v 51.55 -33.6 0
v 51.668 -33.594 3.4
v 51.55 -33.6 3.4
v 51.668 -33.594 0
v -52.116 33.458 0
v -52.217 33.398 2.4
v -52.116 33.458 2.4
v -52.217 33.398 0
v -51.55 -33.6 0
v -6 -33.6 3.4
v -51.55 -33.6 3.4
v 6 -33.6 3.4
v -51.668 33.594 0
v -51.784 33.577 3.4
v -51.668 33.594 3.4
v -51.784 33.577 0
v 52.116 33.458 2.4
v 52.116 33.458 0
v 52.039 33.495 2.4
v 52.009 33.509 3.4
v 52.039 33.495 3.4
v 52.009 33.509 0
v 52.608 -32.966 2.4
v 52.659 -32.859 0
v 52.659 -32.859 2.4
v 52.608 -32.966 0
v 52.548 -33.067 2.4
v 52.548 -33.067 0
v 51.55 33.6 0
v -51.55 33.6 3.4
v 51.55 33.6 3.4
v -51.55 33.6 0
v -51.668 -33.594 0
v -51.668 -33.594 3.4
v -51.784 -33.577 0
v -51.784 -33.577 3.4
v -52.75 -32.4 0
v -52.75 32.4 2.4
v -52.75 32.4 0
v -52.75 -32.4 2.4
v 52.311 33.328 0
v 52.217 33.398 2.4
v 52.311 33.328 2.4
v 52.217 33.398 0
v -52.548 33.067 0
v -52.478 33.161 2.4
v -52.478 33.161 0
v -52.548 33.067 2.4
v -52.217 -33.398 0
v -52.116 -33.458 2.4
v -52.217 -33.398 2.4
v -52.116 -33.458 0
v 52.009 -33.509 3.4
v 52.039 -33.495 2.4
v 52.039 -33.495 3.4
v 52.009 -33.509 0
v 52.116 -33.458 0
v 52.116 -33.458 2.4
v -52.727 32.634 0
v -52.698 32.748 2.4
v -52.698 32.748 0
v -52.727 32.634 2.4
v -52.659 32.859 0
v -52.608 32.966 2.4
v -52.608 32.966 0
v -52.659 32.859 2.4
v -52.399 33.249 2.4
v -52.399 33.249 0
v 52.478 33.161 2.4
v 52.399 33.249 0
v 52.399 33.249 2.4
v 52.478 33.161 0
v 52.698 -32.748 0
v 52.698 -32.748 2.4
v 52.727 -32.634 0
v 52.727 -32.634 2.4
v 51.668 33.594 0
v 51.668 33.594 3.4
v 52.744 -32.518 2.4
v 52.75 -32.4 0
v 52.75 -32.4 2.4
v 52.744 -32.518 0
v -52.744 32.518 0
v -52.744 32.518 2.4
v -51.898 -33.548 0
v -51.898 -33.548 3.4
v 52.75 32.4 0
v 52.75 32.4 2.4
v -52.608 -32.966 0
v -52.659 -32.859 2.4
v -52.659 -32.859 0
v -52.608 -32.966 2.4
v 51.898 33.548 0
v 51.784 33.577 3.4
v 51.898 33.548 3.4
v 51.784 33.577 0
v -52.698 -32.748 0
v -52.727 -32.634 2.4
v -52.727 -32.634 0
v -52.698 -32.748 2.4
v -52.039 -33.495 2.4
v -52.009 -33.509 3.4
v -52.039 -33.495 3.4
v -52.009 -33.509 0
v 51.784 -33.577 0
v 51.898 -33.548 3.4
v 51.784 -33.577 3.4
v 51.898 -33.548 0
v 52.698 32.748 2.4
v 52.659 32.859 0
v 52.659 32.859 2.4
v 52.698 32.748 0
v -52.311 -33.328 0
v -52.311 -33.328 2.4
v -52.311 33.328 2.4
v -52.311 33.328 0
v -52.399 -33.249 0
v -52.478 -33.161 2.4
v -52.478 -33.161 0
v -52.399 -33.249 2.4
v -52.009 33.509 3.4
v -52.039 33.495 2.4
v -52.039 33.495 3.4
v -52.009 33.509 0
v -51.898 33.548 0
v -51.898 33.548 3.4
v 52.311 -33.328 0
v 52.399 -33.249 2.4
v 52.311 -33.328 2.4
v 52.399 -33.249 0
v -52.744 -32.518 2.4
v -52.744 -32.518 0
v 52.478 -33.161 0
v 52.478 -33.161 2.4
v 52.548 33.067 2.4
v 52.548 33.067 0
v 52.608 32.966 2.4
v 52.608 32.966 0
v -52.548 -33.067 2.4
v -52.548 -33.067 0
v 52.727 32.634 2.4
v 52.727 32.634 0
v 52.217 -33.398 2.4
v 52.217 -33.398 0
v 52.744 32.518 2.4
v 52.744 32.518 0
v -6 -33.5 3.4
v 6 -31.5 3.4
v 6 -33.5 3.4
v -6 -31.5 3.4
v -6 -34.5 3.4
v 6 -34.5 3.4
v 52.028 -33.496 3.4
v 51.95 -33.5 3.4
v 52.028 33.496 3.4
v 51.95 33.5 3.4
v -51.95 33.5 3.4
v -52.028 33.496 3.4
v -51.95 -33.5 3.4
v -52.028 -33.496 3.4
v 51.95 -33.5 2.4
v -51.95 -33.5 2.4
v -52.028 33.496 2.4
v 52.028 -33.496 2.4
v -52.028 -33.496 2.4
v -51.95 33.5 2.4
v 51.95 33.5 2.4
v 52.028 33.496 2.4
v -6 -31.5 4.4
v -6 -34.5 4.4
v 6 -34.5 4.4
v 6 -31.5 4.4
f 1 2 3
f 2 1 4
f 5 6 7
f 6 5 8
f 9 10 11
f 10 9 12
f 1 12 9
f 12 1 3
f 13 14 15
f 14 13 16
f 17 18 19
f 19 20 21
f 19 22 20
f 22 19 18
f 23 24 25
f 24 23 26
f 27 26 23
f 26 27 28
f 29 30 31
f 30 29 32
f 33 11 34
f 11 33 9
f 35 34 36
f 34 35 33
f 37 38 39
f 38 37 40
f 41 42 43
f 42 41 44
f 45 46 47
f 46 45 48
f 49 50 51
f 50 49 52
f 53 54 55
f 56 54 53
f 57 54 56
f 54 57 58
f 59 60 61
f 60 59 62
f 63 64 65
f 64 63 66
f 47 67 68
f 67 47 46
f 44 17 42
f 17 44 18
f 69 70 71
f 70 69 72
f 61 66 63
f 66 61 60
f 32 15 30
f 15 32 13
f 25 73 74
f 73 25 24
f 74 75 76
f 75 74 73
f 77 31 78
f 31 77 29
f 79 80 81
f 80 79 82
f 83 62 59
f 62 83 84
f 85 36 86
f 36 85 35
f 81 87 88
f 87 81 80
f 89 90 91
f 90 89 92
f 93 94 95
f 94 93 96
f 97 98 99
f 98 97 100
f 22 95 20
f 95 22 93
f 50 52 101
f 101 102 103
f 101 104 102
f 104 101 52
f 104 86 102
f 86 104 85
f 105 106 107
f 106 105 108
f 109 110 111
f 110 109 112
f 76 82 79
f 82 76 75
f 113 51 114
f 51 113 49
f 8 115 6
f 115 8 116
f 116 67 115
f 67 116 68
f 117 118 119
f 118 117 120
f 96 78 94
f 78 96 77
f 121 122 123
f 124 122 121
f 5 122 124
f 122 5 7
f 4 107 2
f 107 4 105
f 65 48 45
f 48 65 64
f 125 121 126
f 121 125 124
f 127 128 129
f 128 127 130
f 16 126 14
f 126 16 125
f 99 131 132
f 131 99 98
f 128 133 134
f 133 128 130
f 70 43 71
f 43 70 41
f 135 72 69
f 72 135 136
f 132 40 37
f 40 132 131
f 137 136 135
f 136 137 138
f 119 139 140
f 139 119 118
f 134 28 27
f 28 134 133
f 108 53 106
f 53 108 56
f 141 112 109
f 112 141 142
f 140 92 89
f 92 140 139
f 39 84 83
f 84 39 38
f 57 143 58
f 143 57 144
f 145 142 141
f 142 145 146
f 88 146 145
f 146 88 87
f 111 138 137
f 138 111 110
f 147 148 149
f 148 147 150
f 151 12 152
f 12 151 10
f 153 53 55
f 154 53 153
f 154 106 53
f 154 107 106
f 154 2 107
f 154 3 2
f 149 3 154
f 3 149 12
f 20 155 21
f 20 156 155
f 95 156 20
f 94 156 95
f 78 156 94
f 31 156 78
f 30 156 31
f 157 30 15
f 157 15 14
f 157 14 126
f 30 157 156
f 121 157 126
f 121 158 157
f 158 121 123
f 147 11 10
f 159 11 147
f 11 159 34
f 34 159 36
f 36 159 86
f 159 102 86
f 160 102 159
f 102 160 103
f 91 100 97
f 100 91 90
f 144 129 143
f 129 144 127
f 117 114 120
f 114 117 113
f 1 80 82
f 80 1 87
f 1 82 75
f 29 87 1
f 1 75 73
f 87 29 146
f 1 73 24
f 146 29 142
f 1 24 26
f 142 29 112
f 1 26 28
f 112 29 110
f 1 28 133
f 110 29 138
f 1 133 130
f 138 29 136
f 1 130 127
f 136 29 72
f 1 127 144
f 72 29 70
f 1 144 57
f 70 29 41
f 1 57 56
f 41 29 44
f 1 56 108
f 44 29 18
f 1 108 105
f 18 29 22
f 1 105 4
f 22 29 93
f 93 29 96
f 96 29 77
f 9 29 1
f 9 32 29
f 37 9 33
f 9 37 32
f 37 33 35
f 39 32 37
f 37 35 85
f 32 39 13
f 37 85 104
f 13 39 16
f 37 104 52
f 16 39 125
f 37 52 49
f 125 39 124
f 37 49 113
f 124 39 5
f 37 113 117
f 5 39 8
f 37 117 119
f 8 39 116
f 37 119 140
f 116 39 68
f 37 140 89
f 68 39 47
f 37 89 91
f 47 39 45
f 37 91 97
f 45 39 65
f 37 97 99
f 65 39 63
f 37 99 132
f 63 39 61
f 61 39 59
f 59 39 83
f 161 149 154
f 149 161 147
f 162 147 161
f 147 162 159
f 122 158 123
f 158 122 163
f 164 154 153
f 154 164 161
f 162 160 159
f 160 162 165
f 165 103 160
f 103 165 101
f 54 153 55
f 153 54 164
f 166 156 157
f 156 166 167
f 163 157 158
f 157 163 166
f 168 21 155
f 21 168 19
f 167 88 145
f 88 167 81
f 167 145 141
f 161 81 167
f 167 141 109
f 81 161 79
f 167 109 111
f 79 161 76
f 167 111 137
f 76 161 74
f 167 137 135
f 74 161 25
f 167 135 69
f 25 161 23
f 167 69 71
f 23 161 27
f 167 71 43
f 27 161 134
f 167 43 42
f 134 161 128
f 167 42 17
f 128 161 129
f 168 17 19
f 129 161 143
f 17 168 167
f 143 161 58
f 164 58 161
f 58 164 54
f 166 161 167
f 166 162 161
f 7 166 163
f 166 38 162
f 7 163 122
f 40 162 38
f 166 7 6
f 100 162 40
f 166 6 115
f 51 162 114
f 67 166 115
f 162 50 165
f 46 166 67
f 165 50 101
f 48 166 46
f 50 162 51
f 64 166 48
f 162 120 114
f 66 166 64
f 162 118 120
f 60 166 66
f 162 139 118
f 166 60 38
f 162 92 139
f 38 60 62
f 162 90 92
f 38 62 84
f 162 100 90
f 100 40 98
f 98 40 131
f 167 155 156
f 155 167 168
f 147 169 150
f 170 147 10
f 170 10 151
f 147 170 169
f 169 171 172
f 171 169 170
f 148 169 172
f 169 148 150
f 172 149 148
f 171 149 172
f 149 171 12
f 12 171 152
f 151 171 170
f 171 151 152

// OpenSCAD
$fn=64;

module rounded_rect_2d(w,h,r){
    r2 = min(r, min(w,h)/2);
    offset(r=r2) offset(delta=-r2) square([w,h], center=true);
}

module lcd_display_4p3(){
    // Overall dimensions
    w = 105.5;
    h = 67.2;
    t = 3.4;

    // Bezel / body
    body_r = 1.2;

    // Screen window (from description: 105.5 x 65, with +1mm y padding on both sides)
    win_w = 105.5;
    win_h = 65 + 2; // 67
    win_r = 0.8;

    // Small feature block (from description: [[0, -34.5], [12, -31.5]])
    // Interpreted as a small rectangular protrusion centered at x=0, spanning y from -34.5 to -31.5
    feat_xc = 0;
    feat_y1 = -34.5;
    feat_y2 = -31.5;
    feat_w  = 12;
    feat_h  = abs(feat_y2 - feat_y1);
    feat_t  = 1.0;

    difference(){
        // Main body
        linear_extrude(height=t)
            rounded_rect_2d(w,h,body_r);

        // Screen window recess (shallow)
        translate([0,0,t-1.0])
            linear_extrude(height=1.05)
                rounded_rect_2d(win_w, win_h, win_r);
    }

    // Feature block on front face
    translate([feat_xc, (feat_y1+feat_y2)/2, t])
        linear_extrude(height=feat_t)
            square([feat_w, feat_h], center=true);
}

lcd_display_4p3();
